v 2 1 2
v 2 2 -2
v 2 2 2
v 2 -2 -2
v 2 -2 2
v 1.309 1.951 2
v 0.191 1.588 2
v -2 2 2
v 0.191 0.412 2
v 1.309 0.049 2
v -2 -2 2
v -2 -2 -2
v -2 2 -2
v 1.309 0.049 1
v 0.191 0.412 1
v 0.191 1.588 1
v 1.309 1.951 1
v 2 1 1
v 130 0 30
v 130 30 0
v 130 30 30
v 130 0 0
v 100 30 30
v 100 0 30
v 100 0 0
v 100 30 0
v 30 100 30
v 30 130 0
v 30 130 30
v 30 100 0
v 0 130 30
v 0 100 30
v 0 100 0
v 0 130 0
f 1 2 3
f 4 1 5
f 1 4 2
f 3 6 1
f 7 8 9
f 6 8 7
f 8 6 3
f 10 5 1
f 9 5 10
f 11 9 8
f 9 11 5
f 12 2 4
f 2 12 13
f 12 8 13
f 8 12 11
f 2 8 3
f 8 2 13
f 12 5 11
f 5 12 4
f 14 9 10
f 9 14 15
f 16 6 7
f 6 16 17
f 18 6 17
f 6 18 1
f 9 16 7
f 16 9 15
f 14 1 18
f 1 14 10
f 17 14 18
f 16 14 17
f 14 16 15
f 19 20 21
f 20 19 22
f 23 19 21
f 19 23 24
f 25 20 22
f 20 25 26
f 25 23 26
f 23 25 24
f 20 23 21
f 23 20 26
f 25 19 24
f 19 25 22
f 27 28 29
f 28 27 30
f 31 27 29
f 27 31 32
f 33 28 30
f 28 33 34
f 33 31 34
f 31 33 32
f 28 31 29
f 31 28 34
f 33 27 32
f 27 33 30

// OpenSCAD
difference(){
    cube(4,center=true);
    translate([1,1,1]) cylinder(1);
}


translate([100,0,0]){
    cube(30);
};


translate([0,100,0]){
    cube(30);
};
